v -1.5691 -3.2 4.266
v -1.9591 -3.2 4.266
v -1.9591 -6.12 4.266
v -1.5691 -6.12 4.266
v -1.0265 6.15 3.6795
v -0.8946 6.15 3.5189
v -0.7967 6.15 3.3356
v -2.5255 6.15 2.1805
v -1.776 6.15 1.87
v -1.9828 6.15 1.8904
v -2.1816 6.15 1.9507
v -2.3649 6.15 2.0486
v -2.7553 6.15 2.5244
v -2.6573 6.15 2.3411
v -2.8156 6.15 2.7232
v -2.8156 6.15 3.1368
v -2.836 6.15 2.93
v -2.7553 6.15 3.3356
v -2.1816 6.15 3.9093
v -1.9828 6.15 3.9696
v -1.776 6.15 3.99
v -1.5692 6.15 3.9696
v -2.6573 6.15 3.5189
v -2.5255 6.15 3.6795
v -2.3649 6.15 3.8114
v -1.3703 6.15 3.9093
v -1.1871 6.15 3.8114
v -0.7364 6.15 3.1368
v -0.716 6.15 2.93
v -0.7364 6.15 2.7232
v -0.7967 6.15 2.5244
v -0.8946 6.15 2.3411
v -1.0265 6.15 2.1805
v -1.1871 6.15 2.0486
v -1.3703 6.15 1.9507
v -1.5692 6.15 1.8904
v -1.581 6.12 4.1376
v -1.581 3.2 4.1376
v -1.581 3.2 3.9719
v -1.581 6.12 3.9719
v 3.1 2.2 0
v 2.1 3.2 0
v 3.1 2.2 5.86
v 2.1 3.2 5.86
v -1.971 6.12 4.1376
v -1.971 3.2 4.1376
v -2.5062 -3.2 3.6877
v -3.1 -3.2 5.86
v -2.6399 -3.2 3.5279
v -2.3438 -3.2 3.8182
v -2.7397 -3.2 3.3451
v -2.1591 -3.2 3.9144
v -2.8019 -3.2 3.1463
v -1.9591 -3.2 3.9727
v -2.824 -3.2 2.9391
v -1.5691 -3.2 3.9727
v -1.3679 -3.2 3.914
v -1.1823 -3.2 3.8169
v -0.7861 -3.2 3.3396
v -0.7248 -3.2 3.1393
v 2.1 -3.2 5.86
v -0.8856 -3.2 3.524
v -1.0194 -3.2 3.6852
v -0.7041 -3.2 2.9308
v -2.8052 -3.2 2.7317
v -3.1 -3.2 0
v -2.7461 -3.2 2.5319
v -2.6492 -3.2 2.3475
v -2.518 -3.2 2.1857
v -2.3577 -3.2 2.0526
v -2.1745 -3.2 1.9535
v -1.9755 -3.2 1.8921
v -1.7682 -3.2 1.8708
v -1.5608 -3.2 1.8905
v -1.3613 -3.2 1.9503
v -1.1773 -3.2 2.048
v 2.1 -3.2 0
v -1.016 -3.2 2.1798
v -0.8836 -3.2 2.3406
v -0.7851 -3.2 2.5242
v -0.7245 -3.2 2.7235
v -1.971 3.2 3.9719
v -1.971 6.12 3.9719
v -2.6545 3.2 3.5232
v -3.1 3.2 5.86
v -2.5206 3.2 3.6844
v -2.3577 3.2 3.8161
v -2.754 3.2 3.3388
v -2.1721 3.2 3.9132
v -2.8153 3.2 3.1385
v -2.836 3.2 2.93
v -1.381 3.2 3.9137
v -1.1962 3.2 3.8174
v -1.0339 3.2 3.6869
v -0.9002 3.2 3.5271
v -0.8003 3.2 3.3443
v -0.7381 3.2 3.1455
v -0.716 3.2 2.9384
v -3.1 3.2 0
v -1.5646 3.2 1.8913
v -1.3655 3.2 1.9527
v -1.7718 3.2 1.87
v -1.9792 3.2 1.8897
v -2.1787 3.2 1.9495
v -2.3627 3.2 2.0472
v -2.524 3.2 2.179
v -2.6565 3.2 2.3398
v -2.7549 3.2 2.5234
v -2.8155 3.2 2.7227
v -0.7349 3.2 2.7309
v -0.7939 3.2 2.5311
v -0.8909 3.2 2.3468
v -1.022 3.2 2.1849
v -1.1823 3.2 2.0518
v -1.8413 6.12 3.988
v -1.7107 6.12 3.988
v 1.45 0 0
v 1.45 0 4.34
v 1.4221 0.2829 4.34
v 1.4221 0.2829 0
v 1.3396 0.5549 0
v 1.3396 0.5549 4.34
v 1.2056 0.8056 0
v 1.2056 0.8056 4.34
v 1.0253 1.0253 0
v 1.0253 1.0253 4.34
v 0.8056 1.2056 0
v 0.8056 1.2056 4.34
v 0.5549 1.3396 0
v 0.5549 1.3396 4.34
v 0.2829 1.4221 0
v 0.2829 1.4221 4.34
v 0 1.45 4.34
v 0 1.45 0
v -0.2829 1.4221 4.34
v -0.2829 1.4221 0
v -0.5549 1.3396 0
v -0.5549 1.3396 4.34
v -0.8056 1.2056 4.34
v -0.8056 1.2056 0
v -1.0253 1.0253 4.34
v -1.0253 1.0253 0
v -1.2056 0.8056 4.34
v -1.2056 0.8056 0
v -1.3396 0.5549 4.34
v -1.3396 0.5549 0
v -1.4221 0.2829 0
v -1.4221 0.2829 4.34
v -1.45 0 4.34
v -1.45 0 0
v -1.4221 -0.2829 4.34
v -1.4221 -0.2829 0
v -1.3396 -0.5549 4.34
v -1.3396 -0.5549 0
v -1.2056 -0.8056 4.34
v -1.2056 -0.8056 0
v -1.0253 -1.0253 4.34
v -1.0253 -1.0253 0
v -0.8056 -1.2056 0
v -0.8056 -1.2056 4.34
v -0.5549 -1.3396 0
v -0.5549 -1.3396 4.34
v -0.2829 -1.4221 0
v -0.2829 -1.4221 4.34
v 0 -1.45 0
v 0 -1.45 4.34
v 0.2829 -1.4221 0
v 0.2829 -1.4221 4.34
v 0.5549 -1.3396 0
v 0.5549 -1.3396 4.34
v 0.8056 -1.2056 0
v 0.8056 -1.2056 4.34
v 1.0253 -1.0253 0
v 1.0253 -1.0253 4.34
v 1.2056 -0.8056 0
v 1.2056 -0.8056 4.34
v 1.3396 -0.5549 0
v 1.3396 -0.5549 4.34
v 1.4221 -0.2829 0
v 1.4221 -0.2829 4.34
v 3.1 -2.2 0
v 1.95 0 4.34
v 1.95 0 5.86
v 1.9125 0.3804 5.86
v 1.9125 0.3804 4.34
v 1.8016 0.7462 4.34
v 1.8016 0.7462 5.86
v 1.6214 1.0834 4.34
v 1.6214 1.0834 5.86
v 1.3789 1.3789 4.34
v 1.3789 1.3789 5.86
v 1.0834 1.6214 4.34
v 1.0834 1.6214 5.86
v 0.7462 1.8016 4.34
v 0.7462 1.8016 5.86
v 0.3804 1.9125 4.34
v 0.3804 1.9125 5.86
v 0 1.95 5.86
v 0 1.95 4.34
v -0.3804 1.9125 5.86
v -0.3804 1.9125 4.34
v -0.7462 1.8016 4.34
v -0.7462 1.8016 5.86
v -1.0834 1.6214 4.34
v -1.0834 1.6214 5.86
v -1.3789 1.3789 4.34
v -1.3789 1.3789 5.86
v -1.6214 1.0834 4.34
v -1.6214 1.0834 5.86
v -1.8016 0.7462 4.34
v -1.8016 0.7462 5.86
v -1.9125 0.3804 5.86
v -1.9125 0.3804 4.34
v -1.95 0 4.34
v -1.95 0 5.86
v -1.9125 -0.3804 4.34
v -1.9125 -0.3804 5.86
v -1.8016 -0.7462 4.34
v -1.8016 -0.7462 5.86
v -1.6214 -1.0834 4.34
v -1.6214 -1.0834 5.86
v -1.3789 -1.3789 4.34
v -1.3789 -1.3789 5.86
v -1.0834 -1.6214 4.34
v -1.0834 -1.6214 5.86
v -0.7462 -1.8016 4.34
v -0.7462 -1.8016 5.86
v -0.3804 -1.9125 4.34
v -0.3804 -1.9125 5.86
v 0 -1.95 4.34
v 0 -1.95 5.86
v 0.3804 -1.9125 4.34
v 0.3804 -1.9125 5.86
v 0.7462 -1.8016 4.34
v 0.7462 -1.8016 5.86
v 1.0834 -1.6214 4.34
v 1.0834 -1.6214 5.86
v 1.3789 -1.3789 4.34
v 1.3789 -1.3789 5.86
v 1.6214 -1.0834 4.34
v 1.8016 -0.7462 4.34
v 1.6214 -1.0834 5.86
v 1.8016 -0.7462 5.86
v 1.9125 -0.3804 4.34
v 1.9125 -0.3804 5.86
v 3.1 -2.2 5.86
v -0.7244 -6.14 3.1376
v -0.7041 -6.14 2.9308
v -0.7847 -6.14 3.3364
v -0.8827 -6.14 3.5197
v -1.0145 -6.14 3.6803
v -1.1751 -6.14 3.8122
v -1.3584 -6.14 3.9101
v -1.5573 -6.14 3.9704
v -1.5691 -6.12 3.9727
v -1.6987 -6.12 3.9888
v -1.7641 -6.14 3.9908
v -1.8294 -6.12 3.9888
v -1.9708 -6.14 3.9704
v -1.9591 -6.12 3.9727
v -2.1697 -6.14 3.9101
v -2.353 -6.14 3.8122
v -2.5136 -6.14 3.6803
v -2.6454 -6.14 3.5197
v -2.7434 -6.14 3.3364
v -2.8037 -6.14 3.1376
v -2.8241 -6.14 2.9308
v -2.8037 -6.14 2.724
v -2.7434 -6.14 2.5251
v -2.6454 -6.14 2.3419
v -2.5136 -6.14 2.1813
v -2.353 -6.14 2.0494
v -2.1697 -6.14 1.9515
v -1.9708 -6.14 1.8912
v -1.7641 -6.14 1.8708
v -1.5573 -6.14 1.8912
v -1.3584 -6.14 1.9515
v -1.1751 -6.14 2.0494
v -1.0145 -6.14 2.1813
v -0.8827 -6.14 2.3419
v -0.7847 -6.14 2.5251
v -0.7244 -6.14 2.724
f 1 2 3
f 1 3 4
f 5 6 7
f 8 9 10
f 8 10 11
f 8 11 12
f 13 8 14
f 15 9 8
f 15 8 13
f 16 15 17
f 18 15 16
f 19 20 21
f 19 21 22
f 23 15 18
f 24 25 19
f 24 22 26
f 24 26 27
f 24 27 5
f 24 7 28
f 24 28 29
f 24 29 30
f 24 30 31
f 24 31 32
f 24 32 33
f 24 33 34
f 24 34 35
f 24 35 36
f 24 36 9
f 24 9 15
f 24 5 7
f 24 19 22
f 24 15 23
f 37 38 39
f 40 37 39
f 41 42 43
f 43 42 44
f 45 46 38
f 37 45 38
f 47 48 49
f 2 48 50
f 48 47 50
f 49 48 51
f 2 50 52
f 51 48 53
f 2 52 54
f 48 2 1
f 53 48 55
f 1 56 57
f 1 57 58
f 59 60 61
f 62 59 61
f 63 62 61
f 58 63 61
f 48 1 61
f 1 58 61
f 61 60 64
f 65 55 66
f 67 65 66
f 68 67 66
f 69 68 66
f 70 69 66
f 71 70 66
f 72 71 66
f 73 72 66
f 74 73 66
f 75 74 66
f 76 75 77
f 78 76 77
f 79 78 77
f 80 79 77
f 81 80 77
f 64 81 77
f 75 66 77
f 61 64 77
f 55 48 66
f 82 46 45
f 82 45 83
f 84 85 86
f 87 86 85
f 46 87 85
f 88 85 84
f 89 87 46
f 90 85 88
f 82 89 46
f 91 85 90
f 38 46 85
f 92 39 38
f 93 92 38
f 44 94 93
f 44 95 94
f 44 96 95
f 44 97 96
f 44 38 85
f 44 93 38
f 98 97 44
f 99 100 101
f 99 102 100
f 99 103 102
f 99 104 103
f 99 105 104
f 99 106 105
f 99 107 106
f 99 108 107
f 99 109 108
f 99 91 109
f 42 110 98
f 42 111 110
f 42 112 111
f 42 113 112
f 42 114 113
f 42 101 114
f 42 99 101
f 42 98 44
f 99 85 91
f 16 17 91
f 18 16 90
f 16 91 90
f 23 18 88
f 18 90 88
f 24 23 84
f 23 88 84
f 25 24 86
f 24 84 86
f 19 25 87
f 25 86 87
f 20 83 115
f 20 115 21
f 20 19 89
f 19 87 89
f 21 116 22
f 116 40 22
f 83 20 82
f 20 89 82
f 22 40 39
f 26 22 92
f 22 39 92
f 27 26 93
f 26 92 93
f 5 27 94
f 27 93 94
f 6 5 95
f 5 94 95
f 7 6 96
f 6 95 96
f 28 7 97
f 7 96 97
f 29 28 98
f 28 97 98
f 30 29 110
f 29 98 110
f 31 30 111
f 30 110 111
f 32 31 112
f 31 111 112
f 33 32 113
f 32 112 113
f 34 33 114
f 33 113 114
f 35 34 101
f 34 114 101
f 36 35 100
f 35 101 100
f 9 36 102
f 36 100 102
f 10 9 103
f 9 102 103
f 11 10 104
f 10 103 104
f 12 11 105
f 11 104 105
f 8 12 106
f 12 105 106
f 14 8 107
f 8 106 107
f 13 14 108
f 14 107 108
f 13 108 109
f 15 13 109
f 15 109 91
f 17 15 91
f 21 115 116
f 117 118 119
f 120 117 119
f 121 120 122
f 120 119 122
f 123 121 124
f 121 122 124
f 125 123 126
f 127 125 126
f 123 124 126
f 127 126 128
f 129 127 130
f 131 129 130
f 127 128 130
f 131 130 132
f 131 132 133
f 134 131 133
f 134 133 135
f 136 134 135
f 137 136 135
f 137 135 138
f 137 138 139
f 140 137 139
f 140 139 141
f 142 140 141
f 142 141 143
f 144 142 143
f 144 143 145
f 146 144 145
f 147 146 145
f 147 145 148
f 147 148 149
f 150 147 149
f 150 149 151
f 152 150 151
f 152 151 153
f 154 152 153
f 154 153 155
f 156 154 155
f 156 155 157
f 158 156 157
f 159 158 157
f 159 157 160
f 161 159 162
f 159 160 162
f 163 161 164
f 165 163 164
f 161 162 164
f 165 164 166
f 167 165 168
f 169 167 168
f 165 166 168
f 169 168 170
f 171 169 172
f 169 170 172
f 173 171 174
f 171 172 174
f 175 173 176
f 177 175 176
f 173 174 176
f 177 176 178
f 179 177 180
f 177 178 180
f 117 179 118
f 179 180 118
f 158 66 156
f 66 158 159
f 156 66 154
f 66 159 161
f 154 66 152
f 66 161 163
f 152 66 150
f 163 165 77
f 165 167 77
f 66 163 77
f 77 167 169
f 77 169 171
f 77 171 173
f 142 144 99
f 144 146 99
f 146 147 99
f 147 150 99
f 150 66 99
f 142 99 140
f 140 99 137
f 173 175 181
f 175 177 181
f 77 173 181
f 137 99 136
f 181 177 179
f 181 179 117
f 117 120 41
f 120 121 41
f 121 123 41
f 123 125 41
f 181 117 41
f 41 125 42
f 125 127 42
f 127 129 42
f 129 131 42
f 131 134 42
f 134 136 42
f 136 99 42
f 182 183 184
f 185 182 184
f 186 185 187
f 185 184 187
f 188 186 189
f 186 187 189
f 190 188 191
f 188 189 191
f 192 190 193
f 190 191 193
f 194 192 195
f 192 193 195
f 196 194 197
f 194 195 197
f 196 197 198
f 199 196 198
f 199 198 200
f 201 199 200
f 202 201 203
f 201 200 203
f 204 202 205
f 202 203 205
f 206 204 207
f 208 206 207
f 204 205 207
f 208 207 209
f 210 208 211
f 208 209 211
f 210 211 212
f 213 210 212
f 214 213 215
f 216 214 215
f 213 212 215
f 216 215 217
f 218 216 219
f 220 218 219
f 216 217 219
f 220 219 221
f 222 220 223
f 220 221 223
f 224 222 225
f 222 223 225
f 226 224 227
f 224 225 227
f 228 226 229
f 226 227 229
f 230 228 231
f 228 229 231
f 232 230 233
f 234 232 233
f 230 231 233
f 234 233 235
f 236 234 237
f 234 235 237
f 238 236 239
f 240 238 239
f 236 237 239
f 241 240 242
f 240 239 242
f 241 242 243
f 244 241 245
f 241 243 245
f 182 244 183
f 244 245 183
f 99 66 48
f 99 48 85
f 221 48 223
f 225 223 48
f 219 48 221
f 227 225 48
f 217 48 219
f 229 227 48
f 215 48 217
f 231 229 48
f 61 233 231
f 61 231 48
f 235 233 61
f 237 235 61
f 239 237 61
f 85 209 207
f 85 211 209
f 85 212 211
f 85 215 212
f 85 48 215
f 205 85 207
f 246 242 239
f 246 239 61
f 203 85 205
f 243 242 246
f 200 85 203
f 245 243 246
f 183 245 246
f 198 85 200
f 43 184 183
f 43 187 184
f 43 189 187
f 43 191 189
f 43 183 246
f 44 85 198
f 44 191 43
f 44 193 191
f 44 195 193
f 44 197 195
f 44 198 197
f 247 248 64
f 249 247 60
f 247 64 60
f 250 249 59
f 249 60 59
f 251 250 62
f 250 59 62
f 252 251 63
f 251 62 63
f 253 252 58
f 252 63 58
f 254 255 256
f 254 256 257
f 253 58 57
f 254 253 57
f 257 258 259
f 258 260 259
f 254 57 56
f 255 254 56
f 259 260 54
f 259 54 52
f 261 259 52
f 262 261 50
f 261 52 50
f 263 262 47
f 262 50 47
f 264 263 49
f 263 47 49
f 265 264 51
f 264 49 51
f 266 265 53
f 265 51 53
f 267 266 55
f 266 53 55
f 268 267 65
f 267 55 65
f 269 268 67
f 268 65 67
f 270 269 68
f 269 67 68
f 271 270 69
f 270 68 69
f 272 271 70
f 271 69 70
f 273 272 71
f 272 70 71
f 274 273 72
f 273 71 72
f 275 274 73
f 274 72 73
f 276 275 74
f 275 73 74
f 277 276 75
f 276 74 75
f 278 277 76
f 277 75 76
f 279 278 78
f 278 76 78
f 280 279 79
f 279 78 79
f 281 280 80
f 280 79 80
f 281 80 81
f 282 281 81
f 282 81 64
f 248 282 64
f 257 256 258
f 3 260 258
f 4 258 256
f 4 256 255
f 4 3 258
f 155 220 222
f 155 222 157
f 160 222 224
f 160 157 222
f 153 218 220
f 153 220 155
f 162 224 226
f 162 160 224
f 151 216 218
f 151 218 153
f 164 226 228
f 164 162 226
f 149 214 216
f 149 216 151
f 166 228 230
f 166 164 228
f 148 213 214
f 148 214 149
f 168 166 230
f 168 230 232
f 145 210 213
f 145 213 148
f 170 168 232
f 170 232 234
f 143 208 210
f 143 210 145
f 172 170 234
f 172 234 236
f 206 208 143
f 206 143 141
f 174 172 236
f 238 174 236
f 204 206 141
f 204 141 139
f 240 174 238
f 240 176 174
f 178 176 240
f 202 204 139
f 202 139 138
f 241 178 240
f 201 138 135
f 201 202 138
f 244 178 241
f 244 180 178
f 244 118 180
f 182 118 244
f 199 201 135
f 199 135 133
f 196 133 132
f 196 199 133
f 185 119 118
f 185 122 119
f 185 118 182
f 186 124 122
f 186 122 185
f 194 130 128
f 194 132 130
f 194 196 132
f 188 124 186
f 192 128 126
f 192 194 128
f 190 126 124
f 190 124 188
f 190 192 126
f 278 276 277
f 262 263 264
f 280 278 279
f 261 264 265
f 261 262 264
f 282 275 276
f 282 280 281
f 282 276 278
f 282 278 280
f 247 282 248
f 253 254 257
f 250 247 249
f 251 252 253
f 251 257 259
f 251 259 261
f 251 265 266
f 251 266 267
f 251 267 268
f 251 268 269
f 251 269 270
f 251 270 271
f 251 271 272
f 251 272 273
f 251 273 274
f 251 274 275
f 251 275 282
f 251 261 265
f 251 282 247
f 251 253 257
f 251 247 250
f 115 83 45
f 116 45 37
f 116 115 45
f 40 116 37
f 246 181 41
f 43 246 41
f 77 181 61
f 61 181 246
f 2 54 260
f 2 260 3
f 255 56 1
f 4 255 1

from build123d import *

# Parameters (mm, degrees)
SKETCH2_W           = 6.2
SKETCH2_H           = 6.4
BOSS_EXTRUDE1_DEPTH = 5.86
CHAMFER1_SIZE       = 1
SKETCH5_R           = 1.95
CUT_EXTRUDE3_DEPTH  = 1.52
SKETCH6_R           = 1.45
CUT_EXTRUDE4_DEPTH  = 7.219774916
SKETCH7_R           = 1.06
BOSS_EXTRUDE2_DEPTH = 2.95
SKETCH8_W           = 0.39
SKETCH8_H           = 0.295203358
BOSS_EXTRUDE3_DEPTH = 2.92
SKETCH9_R           = 1.06
BOSS_EXTRUDE4_DEPTH = 2.94
SKETCH11_W          = 0.39
SKETCH11_H          = 0.550473967
BOSS_EXTRUDE5_DEPTH = 2.92


with BuildPart() as part:
    # Sketch2 → Boss-Extrude1 (new body)
    with BuildSketch(Plane.XY):
        Rectangle(SKETCH2_W, SKETCH2_H)
    extrude(amount=BOSS_EXTRUDE1_DEPTH)

    # Chamfer1
    chamfer1_edges = [part.edges().sort_by_distance(p)[0] for p in [
        (3.1, 3.2, 2.93),
        (3.1, -3.2, 2.93),
    ]]
    chamfer(chamfer1_edges, length=CHAMFER1_SIZE)

    # Sketch5 → Cut-Extrude3 (cut)
    with BuildSketch(Plane.XY.offset(5.86)):
        Circle(SKETCH5_R)
    extrude(amount=-CUT_EXTRUDE3_DEPTH, mode=Mode.SUBTRACT)

    # Sketch6 → Cut-Extrude4 (cut, through all)
    with BuildSketch(Plane.XY.offset(4.34)):
        Circle(SKETCH6_R)
    extrude(amount=-CUT_EXTRUDE4_DEPTH, mode=Mode.SUBTRACT)

    # Sketch7 → Boss-Extrude2 (add)
    with BuildSketch(Plane(origin=(0, 3.2, 0), x_dir=(1, 0, 0), z_dir=(0, 1, 0))):
        with Locations(Location((-1.775985432, -2.93, 0), (0, 0, 180))):
            Circle(SKETCH7_R)
    extrude(amount=BOSS_EXTRUDE2_DEPTH)

    # Sketch8 → Boss-Extrude3 (add)
    with BuildSketch(Plane(origin=(0, 3.2, 0), x_dir=(1, 0, 0), z_dir=(0, 1, 0))):
        with Locations((-1.775985432, -3.99)):
            Rectangle(SKETCH8_W, SKETCH8_H)
    extrude(amount=BOSS_EXTRUDE3_DEPTH)

    # Sketch9 → Boss-Extrude4 (add)
    with BuildSketch(Plane.XZ.offset(3.2)):
        with Locations((-1.764050238, 2.930792226)):
            Circle(SKETCH9_R)
    extrude(amount=BOSS_EXTRUDE4_DEPTH)

    # Sketch11 → Boss-Extrude5 (add)
    with BuildSketch(Plane.XZ.offset(3.2)):
        with Locations((-1.764050238, 3.990792225)):
            Rectangle(SKETCH11_W, SKETCH11_H)
    extrude(amount=BOSS_EXTRUDE5_DEPTH)


solid = part.part
